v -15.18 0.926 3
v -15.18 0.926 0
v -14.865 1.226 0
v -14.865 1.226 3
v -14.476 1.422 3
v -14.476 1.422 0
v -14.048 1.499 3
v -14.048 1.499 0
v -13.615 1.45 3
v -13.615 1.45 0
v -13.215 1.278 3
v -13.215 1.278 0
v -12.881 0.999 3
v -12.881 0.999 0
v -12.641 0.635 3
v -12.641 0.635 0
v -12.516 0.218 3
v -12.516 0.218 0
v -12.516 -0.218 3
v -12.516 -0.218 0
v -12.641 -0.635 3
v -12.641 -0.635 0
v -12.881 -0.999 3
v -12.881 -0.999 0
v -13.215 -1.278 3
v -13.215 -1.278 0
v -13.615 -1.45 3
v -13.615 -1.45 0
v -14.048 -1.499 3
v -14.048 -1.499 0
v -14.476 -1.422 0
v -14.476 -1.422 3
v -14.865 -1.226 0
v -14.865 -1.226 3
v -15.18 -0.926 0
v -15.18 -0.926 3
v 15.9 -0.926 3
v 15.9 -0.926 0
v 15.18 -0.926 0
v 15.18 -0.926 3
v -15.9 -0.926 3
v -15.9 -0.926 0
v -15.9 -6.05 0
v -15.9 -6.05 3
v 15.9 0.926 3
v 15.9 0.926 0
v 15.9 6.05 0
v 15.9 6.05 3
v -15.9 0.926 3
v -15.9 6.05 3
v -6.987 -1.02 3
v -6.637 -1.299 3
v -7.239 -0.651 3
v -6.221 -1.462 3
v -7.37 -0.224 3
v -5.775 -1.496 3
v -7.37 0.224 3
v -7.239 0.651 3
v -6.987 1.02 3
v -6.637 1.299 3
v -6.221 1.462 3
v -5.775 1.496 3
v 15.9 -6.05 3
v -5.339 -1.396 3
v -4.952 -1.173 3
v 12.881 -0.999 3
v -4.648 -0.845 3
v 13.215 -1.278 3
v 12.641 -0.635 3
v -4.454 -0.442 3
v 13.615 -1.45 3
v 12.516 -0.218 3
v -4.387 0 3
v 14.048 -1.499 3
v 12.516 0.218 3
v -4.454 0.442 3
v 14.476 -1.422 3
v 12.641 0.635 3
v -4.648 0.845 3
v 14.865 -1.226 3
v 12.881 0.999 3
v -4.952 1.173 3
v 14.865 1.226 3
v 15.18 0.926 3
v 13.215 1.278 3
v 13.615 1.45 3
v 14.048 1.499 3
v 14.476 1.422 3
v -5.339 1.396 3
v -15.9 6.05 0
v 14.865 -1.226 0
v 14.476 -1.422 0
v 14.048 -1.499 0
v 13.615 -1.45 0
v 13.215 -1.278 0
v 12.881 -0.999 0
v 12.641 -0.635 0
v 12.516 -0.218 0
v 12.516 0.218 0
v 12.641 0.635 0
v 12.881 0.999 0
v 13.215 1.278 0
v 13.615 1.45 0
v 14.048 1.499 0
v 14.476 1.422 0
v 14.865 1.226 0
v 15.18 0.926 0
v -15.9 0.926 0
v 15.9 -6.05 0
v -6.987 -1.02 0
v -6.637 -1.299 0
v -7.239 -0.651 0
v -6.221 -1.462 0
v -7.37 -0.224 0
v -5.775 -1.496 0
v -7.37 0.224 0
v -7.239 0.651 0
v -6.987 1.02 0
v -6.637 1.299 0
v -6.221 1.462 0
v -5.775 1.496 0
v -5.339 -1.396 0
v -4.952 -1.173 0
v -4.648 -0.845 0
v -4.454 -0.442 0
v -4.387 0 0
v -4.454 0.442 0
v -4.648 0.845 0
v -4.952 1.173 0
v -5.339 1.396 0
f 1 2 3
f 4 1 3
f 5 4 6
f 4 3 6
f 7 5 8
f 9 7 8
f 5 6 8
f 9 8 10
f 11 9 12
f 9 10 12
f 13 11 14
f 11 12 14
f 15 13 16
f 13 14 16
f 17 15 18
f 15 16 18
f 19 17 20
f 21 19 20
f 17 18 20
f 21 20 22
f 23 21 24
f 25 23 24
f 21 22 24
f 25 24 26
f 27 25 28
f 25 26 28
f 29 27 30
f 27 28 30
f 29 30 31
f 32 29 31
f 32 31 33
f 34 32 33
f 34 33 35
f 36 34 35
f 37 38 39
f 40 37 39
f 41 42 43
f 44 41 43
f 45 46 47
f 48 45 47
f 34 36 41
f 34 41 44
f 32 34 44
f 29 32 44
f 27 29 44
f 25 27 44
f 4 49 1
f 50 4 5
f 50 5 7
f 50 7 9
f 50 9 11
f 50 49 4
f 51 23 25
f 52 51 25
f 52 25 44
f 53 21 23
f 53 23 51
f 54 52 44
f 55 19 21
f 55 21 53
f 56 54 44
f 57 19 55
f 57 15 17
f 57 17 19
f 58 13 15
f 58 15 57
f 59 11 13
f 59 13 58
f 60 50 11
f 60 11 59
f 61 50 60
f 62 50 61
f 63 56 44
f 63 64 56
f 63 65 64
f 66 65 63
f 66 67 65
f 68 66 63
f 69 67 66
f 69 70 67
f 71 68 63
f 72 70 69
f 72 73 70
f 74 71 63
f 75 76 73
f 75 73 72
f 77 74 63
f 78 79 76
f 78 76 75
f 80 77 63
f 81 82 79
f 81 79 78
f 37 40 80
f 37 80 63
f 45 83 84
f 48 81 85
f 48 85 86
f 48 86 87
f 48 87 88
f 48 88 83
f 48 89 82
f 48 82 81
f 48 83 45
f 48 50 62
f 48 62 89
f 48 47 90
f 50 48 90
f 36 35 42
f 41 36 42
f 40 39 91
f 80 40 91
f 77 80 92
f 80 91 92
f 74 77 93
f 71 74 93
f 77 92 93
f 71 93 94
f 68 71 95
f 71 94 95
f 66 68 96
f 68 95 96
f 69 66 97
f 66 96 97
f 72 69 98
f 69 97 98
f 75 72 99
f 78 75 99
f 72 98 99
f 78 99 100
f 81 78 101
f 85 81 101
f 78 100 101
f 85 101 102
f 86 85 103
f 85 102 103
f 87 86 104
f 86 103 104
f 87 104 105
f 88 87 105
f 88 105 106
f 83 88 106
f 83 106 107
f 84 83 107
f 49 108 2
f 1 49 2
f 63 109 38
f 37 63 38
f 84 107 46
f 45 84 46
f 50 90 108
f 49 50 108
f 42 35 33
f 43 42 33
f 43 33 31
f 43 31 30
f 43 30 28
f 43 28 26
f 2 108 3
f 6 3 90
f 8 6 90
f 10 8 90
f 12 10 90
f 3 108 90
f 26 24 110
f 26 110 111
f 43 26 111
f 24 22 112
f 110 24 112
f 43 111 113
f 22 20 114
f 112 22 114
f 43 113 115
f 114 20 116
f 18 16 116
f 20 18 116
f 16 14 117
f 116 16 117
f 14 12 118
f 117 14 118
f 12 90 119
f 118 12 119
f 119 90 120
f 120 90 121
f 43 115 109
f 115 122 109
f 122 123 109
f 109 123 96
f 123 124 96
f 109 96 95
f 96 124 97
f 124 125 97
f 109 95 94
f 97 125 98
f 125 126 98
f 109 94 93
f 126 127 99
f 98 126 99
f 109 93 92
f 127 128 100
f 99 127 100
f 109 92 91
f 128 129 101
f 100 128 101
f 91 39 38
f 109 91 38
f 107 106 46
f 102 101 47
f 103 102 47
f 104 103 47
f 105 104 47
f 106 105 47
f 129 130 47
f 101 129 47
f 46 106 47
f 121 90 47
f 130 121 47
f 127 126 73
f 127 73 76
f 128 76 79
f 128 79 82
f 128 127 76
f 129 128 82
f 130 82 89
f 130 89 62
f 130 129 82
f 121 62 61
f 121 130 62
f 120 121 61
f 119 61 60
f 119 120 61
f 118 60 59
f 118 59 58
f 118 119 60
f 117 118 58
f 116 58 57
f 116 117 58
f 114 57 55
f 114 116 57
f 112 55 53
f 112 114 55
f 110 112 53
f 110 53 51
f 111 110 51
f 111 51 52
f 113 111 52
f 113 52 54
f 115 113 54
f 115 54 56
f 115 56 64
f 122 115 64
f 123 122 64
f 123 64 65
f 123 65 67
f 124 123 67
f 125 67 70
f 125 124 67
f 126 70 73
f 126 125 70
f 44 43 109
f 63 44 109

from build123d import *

# Parameters (mm, degrees)
F0_R     = 1.5
F1_DEPTH = 3


with BuildPart() as f1:
    # F0 (on Top) → F1 (new body)
    with BuildSketch(Plane.XY):
        with BuildLine():
            Line((15.9, 6.05), (-15.9, 6.05))
            Line((-15.9, 6.05), (-15.9, 0.92558))
            Line((-15.9, 0.92558), (-15.180382, 0.92558))
            ThreePointArc((-15.180382, 0.92558), (-12.5, 0), (-15.180382, -0.92558))
            Line((-15.180382, -0.92558), (-15.9, -0.92558))
            Line((-15.9, -0.92558), (-15.9, -6.05))
            Line((-15.9, -6.05), (15.9, -6.05))
            Line((15.9, -6.05), (15.9, -0.92558))
            Line((15.9, -0.92558), (15.180382, -0.92558))
            ThreePointArc((15.180382, -0.92558), (12.5, 0), (15.180382, 0.92558))
            Line((15.180382, 0.92558), (15.9, 0.92558))
            Line((15.9, 0.92558), (15.9, 6.05))
        make_face()
        with Locations((-5.88706, 0)):
            Circle(F0_R, mode=Mode.SUBTRACT)
    extrude(amount=F1_DEPTH)


solid = f1.part
